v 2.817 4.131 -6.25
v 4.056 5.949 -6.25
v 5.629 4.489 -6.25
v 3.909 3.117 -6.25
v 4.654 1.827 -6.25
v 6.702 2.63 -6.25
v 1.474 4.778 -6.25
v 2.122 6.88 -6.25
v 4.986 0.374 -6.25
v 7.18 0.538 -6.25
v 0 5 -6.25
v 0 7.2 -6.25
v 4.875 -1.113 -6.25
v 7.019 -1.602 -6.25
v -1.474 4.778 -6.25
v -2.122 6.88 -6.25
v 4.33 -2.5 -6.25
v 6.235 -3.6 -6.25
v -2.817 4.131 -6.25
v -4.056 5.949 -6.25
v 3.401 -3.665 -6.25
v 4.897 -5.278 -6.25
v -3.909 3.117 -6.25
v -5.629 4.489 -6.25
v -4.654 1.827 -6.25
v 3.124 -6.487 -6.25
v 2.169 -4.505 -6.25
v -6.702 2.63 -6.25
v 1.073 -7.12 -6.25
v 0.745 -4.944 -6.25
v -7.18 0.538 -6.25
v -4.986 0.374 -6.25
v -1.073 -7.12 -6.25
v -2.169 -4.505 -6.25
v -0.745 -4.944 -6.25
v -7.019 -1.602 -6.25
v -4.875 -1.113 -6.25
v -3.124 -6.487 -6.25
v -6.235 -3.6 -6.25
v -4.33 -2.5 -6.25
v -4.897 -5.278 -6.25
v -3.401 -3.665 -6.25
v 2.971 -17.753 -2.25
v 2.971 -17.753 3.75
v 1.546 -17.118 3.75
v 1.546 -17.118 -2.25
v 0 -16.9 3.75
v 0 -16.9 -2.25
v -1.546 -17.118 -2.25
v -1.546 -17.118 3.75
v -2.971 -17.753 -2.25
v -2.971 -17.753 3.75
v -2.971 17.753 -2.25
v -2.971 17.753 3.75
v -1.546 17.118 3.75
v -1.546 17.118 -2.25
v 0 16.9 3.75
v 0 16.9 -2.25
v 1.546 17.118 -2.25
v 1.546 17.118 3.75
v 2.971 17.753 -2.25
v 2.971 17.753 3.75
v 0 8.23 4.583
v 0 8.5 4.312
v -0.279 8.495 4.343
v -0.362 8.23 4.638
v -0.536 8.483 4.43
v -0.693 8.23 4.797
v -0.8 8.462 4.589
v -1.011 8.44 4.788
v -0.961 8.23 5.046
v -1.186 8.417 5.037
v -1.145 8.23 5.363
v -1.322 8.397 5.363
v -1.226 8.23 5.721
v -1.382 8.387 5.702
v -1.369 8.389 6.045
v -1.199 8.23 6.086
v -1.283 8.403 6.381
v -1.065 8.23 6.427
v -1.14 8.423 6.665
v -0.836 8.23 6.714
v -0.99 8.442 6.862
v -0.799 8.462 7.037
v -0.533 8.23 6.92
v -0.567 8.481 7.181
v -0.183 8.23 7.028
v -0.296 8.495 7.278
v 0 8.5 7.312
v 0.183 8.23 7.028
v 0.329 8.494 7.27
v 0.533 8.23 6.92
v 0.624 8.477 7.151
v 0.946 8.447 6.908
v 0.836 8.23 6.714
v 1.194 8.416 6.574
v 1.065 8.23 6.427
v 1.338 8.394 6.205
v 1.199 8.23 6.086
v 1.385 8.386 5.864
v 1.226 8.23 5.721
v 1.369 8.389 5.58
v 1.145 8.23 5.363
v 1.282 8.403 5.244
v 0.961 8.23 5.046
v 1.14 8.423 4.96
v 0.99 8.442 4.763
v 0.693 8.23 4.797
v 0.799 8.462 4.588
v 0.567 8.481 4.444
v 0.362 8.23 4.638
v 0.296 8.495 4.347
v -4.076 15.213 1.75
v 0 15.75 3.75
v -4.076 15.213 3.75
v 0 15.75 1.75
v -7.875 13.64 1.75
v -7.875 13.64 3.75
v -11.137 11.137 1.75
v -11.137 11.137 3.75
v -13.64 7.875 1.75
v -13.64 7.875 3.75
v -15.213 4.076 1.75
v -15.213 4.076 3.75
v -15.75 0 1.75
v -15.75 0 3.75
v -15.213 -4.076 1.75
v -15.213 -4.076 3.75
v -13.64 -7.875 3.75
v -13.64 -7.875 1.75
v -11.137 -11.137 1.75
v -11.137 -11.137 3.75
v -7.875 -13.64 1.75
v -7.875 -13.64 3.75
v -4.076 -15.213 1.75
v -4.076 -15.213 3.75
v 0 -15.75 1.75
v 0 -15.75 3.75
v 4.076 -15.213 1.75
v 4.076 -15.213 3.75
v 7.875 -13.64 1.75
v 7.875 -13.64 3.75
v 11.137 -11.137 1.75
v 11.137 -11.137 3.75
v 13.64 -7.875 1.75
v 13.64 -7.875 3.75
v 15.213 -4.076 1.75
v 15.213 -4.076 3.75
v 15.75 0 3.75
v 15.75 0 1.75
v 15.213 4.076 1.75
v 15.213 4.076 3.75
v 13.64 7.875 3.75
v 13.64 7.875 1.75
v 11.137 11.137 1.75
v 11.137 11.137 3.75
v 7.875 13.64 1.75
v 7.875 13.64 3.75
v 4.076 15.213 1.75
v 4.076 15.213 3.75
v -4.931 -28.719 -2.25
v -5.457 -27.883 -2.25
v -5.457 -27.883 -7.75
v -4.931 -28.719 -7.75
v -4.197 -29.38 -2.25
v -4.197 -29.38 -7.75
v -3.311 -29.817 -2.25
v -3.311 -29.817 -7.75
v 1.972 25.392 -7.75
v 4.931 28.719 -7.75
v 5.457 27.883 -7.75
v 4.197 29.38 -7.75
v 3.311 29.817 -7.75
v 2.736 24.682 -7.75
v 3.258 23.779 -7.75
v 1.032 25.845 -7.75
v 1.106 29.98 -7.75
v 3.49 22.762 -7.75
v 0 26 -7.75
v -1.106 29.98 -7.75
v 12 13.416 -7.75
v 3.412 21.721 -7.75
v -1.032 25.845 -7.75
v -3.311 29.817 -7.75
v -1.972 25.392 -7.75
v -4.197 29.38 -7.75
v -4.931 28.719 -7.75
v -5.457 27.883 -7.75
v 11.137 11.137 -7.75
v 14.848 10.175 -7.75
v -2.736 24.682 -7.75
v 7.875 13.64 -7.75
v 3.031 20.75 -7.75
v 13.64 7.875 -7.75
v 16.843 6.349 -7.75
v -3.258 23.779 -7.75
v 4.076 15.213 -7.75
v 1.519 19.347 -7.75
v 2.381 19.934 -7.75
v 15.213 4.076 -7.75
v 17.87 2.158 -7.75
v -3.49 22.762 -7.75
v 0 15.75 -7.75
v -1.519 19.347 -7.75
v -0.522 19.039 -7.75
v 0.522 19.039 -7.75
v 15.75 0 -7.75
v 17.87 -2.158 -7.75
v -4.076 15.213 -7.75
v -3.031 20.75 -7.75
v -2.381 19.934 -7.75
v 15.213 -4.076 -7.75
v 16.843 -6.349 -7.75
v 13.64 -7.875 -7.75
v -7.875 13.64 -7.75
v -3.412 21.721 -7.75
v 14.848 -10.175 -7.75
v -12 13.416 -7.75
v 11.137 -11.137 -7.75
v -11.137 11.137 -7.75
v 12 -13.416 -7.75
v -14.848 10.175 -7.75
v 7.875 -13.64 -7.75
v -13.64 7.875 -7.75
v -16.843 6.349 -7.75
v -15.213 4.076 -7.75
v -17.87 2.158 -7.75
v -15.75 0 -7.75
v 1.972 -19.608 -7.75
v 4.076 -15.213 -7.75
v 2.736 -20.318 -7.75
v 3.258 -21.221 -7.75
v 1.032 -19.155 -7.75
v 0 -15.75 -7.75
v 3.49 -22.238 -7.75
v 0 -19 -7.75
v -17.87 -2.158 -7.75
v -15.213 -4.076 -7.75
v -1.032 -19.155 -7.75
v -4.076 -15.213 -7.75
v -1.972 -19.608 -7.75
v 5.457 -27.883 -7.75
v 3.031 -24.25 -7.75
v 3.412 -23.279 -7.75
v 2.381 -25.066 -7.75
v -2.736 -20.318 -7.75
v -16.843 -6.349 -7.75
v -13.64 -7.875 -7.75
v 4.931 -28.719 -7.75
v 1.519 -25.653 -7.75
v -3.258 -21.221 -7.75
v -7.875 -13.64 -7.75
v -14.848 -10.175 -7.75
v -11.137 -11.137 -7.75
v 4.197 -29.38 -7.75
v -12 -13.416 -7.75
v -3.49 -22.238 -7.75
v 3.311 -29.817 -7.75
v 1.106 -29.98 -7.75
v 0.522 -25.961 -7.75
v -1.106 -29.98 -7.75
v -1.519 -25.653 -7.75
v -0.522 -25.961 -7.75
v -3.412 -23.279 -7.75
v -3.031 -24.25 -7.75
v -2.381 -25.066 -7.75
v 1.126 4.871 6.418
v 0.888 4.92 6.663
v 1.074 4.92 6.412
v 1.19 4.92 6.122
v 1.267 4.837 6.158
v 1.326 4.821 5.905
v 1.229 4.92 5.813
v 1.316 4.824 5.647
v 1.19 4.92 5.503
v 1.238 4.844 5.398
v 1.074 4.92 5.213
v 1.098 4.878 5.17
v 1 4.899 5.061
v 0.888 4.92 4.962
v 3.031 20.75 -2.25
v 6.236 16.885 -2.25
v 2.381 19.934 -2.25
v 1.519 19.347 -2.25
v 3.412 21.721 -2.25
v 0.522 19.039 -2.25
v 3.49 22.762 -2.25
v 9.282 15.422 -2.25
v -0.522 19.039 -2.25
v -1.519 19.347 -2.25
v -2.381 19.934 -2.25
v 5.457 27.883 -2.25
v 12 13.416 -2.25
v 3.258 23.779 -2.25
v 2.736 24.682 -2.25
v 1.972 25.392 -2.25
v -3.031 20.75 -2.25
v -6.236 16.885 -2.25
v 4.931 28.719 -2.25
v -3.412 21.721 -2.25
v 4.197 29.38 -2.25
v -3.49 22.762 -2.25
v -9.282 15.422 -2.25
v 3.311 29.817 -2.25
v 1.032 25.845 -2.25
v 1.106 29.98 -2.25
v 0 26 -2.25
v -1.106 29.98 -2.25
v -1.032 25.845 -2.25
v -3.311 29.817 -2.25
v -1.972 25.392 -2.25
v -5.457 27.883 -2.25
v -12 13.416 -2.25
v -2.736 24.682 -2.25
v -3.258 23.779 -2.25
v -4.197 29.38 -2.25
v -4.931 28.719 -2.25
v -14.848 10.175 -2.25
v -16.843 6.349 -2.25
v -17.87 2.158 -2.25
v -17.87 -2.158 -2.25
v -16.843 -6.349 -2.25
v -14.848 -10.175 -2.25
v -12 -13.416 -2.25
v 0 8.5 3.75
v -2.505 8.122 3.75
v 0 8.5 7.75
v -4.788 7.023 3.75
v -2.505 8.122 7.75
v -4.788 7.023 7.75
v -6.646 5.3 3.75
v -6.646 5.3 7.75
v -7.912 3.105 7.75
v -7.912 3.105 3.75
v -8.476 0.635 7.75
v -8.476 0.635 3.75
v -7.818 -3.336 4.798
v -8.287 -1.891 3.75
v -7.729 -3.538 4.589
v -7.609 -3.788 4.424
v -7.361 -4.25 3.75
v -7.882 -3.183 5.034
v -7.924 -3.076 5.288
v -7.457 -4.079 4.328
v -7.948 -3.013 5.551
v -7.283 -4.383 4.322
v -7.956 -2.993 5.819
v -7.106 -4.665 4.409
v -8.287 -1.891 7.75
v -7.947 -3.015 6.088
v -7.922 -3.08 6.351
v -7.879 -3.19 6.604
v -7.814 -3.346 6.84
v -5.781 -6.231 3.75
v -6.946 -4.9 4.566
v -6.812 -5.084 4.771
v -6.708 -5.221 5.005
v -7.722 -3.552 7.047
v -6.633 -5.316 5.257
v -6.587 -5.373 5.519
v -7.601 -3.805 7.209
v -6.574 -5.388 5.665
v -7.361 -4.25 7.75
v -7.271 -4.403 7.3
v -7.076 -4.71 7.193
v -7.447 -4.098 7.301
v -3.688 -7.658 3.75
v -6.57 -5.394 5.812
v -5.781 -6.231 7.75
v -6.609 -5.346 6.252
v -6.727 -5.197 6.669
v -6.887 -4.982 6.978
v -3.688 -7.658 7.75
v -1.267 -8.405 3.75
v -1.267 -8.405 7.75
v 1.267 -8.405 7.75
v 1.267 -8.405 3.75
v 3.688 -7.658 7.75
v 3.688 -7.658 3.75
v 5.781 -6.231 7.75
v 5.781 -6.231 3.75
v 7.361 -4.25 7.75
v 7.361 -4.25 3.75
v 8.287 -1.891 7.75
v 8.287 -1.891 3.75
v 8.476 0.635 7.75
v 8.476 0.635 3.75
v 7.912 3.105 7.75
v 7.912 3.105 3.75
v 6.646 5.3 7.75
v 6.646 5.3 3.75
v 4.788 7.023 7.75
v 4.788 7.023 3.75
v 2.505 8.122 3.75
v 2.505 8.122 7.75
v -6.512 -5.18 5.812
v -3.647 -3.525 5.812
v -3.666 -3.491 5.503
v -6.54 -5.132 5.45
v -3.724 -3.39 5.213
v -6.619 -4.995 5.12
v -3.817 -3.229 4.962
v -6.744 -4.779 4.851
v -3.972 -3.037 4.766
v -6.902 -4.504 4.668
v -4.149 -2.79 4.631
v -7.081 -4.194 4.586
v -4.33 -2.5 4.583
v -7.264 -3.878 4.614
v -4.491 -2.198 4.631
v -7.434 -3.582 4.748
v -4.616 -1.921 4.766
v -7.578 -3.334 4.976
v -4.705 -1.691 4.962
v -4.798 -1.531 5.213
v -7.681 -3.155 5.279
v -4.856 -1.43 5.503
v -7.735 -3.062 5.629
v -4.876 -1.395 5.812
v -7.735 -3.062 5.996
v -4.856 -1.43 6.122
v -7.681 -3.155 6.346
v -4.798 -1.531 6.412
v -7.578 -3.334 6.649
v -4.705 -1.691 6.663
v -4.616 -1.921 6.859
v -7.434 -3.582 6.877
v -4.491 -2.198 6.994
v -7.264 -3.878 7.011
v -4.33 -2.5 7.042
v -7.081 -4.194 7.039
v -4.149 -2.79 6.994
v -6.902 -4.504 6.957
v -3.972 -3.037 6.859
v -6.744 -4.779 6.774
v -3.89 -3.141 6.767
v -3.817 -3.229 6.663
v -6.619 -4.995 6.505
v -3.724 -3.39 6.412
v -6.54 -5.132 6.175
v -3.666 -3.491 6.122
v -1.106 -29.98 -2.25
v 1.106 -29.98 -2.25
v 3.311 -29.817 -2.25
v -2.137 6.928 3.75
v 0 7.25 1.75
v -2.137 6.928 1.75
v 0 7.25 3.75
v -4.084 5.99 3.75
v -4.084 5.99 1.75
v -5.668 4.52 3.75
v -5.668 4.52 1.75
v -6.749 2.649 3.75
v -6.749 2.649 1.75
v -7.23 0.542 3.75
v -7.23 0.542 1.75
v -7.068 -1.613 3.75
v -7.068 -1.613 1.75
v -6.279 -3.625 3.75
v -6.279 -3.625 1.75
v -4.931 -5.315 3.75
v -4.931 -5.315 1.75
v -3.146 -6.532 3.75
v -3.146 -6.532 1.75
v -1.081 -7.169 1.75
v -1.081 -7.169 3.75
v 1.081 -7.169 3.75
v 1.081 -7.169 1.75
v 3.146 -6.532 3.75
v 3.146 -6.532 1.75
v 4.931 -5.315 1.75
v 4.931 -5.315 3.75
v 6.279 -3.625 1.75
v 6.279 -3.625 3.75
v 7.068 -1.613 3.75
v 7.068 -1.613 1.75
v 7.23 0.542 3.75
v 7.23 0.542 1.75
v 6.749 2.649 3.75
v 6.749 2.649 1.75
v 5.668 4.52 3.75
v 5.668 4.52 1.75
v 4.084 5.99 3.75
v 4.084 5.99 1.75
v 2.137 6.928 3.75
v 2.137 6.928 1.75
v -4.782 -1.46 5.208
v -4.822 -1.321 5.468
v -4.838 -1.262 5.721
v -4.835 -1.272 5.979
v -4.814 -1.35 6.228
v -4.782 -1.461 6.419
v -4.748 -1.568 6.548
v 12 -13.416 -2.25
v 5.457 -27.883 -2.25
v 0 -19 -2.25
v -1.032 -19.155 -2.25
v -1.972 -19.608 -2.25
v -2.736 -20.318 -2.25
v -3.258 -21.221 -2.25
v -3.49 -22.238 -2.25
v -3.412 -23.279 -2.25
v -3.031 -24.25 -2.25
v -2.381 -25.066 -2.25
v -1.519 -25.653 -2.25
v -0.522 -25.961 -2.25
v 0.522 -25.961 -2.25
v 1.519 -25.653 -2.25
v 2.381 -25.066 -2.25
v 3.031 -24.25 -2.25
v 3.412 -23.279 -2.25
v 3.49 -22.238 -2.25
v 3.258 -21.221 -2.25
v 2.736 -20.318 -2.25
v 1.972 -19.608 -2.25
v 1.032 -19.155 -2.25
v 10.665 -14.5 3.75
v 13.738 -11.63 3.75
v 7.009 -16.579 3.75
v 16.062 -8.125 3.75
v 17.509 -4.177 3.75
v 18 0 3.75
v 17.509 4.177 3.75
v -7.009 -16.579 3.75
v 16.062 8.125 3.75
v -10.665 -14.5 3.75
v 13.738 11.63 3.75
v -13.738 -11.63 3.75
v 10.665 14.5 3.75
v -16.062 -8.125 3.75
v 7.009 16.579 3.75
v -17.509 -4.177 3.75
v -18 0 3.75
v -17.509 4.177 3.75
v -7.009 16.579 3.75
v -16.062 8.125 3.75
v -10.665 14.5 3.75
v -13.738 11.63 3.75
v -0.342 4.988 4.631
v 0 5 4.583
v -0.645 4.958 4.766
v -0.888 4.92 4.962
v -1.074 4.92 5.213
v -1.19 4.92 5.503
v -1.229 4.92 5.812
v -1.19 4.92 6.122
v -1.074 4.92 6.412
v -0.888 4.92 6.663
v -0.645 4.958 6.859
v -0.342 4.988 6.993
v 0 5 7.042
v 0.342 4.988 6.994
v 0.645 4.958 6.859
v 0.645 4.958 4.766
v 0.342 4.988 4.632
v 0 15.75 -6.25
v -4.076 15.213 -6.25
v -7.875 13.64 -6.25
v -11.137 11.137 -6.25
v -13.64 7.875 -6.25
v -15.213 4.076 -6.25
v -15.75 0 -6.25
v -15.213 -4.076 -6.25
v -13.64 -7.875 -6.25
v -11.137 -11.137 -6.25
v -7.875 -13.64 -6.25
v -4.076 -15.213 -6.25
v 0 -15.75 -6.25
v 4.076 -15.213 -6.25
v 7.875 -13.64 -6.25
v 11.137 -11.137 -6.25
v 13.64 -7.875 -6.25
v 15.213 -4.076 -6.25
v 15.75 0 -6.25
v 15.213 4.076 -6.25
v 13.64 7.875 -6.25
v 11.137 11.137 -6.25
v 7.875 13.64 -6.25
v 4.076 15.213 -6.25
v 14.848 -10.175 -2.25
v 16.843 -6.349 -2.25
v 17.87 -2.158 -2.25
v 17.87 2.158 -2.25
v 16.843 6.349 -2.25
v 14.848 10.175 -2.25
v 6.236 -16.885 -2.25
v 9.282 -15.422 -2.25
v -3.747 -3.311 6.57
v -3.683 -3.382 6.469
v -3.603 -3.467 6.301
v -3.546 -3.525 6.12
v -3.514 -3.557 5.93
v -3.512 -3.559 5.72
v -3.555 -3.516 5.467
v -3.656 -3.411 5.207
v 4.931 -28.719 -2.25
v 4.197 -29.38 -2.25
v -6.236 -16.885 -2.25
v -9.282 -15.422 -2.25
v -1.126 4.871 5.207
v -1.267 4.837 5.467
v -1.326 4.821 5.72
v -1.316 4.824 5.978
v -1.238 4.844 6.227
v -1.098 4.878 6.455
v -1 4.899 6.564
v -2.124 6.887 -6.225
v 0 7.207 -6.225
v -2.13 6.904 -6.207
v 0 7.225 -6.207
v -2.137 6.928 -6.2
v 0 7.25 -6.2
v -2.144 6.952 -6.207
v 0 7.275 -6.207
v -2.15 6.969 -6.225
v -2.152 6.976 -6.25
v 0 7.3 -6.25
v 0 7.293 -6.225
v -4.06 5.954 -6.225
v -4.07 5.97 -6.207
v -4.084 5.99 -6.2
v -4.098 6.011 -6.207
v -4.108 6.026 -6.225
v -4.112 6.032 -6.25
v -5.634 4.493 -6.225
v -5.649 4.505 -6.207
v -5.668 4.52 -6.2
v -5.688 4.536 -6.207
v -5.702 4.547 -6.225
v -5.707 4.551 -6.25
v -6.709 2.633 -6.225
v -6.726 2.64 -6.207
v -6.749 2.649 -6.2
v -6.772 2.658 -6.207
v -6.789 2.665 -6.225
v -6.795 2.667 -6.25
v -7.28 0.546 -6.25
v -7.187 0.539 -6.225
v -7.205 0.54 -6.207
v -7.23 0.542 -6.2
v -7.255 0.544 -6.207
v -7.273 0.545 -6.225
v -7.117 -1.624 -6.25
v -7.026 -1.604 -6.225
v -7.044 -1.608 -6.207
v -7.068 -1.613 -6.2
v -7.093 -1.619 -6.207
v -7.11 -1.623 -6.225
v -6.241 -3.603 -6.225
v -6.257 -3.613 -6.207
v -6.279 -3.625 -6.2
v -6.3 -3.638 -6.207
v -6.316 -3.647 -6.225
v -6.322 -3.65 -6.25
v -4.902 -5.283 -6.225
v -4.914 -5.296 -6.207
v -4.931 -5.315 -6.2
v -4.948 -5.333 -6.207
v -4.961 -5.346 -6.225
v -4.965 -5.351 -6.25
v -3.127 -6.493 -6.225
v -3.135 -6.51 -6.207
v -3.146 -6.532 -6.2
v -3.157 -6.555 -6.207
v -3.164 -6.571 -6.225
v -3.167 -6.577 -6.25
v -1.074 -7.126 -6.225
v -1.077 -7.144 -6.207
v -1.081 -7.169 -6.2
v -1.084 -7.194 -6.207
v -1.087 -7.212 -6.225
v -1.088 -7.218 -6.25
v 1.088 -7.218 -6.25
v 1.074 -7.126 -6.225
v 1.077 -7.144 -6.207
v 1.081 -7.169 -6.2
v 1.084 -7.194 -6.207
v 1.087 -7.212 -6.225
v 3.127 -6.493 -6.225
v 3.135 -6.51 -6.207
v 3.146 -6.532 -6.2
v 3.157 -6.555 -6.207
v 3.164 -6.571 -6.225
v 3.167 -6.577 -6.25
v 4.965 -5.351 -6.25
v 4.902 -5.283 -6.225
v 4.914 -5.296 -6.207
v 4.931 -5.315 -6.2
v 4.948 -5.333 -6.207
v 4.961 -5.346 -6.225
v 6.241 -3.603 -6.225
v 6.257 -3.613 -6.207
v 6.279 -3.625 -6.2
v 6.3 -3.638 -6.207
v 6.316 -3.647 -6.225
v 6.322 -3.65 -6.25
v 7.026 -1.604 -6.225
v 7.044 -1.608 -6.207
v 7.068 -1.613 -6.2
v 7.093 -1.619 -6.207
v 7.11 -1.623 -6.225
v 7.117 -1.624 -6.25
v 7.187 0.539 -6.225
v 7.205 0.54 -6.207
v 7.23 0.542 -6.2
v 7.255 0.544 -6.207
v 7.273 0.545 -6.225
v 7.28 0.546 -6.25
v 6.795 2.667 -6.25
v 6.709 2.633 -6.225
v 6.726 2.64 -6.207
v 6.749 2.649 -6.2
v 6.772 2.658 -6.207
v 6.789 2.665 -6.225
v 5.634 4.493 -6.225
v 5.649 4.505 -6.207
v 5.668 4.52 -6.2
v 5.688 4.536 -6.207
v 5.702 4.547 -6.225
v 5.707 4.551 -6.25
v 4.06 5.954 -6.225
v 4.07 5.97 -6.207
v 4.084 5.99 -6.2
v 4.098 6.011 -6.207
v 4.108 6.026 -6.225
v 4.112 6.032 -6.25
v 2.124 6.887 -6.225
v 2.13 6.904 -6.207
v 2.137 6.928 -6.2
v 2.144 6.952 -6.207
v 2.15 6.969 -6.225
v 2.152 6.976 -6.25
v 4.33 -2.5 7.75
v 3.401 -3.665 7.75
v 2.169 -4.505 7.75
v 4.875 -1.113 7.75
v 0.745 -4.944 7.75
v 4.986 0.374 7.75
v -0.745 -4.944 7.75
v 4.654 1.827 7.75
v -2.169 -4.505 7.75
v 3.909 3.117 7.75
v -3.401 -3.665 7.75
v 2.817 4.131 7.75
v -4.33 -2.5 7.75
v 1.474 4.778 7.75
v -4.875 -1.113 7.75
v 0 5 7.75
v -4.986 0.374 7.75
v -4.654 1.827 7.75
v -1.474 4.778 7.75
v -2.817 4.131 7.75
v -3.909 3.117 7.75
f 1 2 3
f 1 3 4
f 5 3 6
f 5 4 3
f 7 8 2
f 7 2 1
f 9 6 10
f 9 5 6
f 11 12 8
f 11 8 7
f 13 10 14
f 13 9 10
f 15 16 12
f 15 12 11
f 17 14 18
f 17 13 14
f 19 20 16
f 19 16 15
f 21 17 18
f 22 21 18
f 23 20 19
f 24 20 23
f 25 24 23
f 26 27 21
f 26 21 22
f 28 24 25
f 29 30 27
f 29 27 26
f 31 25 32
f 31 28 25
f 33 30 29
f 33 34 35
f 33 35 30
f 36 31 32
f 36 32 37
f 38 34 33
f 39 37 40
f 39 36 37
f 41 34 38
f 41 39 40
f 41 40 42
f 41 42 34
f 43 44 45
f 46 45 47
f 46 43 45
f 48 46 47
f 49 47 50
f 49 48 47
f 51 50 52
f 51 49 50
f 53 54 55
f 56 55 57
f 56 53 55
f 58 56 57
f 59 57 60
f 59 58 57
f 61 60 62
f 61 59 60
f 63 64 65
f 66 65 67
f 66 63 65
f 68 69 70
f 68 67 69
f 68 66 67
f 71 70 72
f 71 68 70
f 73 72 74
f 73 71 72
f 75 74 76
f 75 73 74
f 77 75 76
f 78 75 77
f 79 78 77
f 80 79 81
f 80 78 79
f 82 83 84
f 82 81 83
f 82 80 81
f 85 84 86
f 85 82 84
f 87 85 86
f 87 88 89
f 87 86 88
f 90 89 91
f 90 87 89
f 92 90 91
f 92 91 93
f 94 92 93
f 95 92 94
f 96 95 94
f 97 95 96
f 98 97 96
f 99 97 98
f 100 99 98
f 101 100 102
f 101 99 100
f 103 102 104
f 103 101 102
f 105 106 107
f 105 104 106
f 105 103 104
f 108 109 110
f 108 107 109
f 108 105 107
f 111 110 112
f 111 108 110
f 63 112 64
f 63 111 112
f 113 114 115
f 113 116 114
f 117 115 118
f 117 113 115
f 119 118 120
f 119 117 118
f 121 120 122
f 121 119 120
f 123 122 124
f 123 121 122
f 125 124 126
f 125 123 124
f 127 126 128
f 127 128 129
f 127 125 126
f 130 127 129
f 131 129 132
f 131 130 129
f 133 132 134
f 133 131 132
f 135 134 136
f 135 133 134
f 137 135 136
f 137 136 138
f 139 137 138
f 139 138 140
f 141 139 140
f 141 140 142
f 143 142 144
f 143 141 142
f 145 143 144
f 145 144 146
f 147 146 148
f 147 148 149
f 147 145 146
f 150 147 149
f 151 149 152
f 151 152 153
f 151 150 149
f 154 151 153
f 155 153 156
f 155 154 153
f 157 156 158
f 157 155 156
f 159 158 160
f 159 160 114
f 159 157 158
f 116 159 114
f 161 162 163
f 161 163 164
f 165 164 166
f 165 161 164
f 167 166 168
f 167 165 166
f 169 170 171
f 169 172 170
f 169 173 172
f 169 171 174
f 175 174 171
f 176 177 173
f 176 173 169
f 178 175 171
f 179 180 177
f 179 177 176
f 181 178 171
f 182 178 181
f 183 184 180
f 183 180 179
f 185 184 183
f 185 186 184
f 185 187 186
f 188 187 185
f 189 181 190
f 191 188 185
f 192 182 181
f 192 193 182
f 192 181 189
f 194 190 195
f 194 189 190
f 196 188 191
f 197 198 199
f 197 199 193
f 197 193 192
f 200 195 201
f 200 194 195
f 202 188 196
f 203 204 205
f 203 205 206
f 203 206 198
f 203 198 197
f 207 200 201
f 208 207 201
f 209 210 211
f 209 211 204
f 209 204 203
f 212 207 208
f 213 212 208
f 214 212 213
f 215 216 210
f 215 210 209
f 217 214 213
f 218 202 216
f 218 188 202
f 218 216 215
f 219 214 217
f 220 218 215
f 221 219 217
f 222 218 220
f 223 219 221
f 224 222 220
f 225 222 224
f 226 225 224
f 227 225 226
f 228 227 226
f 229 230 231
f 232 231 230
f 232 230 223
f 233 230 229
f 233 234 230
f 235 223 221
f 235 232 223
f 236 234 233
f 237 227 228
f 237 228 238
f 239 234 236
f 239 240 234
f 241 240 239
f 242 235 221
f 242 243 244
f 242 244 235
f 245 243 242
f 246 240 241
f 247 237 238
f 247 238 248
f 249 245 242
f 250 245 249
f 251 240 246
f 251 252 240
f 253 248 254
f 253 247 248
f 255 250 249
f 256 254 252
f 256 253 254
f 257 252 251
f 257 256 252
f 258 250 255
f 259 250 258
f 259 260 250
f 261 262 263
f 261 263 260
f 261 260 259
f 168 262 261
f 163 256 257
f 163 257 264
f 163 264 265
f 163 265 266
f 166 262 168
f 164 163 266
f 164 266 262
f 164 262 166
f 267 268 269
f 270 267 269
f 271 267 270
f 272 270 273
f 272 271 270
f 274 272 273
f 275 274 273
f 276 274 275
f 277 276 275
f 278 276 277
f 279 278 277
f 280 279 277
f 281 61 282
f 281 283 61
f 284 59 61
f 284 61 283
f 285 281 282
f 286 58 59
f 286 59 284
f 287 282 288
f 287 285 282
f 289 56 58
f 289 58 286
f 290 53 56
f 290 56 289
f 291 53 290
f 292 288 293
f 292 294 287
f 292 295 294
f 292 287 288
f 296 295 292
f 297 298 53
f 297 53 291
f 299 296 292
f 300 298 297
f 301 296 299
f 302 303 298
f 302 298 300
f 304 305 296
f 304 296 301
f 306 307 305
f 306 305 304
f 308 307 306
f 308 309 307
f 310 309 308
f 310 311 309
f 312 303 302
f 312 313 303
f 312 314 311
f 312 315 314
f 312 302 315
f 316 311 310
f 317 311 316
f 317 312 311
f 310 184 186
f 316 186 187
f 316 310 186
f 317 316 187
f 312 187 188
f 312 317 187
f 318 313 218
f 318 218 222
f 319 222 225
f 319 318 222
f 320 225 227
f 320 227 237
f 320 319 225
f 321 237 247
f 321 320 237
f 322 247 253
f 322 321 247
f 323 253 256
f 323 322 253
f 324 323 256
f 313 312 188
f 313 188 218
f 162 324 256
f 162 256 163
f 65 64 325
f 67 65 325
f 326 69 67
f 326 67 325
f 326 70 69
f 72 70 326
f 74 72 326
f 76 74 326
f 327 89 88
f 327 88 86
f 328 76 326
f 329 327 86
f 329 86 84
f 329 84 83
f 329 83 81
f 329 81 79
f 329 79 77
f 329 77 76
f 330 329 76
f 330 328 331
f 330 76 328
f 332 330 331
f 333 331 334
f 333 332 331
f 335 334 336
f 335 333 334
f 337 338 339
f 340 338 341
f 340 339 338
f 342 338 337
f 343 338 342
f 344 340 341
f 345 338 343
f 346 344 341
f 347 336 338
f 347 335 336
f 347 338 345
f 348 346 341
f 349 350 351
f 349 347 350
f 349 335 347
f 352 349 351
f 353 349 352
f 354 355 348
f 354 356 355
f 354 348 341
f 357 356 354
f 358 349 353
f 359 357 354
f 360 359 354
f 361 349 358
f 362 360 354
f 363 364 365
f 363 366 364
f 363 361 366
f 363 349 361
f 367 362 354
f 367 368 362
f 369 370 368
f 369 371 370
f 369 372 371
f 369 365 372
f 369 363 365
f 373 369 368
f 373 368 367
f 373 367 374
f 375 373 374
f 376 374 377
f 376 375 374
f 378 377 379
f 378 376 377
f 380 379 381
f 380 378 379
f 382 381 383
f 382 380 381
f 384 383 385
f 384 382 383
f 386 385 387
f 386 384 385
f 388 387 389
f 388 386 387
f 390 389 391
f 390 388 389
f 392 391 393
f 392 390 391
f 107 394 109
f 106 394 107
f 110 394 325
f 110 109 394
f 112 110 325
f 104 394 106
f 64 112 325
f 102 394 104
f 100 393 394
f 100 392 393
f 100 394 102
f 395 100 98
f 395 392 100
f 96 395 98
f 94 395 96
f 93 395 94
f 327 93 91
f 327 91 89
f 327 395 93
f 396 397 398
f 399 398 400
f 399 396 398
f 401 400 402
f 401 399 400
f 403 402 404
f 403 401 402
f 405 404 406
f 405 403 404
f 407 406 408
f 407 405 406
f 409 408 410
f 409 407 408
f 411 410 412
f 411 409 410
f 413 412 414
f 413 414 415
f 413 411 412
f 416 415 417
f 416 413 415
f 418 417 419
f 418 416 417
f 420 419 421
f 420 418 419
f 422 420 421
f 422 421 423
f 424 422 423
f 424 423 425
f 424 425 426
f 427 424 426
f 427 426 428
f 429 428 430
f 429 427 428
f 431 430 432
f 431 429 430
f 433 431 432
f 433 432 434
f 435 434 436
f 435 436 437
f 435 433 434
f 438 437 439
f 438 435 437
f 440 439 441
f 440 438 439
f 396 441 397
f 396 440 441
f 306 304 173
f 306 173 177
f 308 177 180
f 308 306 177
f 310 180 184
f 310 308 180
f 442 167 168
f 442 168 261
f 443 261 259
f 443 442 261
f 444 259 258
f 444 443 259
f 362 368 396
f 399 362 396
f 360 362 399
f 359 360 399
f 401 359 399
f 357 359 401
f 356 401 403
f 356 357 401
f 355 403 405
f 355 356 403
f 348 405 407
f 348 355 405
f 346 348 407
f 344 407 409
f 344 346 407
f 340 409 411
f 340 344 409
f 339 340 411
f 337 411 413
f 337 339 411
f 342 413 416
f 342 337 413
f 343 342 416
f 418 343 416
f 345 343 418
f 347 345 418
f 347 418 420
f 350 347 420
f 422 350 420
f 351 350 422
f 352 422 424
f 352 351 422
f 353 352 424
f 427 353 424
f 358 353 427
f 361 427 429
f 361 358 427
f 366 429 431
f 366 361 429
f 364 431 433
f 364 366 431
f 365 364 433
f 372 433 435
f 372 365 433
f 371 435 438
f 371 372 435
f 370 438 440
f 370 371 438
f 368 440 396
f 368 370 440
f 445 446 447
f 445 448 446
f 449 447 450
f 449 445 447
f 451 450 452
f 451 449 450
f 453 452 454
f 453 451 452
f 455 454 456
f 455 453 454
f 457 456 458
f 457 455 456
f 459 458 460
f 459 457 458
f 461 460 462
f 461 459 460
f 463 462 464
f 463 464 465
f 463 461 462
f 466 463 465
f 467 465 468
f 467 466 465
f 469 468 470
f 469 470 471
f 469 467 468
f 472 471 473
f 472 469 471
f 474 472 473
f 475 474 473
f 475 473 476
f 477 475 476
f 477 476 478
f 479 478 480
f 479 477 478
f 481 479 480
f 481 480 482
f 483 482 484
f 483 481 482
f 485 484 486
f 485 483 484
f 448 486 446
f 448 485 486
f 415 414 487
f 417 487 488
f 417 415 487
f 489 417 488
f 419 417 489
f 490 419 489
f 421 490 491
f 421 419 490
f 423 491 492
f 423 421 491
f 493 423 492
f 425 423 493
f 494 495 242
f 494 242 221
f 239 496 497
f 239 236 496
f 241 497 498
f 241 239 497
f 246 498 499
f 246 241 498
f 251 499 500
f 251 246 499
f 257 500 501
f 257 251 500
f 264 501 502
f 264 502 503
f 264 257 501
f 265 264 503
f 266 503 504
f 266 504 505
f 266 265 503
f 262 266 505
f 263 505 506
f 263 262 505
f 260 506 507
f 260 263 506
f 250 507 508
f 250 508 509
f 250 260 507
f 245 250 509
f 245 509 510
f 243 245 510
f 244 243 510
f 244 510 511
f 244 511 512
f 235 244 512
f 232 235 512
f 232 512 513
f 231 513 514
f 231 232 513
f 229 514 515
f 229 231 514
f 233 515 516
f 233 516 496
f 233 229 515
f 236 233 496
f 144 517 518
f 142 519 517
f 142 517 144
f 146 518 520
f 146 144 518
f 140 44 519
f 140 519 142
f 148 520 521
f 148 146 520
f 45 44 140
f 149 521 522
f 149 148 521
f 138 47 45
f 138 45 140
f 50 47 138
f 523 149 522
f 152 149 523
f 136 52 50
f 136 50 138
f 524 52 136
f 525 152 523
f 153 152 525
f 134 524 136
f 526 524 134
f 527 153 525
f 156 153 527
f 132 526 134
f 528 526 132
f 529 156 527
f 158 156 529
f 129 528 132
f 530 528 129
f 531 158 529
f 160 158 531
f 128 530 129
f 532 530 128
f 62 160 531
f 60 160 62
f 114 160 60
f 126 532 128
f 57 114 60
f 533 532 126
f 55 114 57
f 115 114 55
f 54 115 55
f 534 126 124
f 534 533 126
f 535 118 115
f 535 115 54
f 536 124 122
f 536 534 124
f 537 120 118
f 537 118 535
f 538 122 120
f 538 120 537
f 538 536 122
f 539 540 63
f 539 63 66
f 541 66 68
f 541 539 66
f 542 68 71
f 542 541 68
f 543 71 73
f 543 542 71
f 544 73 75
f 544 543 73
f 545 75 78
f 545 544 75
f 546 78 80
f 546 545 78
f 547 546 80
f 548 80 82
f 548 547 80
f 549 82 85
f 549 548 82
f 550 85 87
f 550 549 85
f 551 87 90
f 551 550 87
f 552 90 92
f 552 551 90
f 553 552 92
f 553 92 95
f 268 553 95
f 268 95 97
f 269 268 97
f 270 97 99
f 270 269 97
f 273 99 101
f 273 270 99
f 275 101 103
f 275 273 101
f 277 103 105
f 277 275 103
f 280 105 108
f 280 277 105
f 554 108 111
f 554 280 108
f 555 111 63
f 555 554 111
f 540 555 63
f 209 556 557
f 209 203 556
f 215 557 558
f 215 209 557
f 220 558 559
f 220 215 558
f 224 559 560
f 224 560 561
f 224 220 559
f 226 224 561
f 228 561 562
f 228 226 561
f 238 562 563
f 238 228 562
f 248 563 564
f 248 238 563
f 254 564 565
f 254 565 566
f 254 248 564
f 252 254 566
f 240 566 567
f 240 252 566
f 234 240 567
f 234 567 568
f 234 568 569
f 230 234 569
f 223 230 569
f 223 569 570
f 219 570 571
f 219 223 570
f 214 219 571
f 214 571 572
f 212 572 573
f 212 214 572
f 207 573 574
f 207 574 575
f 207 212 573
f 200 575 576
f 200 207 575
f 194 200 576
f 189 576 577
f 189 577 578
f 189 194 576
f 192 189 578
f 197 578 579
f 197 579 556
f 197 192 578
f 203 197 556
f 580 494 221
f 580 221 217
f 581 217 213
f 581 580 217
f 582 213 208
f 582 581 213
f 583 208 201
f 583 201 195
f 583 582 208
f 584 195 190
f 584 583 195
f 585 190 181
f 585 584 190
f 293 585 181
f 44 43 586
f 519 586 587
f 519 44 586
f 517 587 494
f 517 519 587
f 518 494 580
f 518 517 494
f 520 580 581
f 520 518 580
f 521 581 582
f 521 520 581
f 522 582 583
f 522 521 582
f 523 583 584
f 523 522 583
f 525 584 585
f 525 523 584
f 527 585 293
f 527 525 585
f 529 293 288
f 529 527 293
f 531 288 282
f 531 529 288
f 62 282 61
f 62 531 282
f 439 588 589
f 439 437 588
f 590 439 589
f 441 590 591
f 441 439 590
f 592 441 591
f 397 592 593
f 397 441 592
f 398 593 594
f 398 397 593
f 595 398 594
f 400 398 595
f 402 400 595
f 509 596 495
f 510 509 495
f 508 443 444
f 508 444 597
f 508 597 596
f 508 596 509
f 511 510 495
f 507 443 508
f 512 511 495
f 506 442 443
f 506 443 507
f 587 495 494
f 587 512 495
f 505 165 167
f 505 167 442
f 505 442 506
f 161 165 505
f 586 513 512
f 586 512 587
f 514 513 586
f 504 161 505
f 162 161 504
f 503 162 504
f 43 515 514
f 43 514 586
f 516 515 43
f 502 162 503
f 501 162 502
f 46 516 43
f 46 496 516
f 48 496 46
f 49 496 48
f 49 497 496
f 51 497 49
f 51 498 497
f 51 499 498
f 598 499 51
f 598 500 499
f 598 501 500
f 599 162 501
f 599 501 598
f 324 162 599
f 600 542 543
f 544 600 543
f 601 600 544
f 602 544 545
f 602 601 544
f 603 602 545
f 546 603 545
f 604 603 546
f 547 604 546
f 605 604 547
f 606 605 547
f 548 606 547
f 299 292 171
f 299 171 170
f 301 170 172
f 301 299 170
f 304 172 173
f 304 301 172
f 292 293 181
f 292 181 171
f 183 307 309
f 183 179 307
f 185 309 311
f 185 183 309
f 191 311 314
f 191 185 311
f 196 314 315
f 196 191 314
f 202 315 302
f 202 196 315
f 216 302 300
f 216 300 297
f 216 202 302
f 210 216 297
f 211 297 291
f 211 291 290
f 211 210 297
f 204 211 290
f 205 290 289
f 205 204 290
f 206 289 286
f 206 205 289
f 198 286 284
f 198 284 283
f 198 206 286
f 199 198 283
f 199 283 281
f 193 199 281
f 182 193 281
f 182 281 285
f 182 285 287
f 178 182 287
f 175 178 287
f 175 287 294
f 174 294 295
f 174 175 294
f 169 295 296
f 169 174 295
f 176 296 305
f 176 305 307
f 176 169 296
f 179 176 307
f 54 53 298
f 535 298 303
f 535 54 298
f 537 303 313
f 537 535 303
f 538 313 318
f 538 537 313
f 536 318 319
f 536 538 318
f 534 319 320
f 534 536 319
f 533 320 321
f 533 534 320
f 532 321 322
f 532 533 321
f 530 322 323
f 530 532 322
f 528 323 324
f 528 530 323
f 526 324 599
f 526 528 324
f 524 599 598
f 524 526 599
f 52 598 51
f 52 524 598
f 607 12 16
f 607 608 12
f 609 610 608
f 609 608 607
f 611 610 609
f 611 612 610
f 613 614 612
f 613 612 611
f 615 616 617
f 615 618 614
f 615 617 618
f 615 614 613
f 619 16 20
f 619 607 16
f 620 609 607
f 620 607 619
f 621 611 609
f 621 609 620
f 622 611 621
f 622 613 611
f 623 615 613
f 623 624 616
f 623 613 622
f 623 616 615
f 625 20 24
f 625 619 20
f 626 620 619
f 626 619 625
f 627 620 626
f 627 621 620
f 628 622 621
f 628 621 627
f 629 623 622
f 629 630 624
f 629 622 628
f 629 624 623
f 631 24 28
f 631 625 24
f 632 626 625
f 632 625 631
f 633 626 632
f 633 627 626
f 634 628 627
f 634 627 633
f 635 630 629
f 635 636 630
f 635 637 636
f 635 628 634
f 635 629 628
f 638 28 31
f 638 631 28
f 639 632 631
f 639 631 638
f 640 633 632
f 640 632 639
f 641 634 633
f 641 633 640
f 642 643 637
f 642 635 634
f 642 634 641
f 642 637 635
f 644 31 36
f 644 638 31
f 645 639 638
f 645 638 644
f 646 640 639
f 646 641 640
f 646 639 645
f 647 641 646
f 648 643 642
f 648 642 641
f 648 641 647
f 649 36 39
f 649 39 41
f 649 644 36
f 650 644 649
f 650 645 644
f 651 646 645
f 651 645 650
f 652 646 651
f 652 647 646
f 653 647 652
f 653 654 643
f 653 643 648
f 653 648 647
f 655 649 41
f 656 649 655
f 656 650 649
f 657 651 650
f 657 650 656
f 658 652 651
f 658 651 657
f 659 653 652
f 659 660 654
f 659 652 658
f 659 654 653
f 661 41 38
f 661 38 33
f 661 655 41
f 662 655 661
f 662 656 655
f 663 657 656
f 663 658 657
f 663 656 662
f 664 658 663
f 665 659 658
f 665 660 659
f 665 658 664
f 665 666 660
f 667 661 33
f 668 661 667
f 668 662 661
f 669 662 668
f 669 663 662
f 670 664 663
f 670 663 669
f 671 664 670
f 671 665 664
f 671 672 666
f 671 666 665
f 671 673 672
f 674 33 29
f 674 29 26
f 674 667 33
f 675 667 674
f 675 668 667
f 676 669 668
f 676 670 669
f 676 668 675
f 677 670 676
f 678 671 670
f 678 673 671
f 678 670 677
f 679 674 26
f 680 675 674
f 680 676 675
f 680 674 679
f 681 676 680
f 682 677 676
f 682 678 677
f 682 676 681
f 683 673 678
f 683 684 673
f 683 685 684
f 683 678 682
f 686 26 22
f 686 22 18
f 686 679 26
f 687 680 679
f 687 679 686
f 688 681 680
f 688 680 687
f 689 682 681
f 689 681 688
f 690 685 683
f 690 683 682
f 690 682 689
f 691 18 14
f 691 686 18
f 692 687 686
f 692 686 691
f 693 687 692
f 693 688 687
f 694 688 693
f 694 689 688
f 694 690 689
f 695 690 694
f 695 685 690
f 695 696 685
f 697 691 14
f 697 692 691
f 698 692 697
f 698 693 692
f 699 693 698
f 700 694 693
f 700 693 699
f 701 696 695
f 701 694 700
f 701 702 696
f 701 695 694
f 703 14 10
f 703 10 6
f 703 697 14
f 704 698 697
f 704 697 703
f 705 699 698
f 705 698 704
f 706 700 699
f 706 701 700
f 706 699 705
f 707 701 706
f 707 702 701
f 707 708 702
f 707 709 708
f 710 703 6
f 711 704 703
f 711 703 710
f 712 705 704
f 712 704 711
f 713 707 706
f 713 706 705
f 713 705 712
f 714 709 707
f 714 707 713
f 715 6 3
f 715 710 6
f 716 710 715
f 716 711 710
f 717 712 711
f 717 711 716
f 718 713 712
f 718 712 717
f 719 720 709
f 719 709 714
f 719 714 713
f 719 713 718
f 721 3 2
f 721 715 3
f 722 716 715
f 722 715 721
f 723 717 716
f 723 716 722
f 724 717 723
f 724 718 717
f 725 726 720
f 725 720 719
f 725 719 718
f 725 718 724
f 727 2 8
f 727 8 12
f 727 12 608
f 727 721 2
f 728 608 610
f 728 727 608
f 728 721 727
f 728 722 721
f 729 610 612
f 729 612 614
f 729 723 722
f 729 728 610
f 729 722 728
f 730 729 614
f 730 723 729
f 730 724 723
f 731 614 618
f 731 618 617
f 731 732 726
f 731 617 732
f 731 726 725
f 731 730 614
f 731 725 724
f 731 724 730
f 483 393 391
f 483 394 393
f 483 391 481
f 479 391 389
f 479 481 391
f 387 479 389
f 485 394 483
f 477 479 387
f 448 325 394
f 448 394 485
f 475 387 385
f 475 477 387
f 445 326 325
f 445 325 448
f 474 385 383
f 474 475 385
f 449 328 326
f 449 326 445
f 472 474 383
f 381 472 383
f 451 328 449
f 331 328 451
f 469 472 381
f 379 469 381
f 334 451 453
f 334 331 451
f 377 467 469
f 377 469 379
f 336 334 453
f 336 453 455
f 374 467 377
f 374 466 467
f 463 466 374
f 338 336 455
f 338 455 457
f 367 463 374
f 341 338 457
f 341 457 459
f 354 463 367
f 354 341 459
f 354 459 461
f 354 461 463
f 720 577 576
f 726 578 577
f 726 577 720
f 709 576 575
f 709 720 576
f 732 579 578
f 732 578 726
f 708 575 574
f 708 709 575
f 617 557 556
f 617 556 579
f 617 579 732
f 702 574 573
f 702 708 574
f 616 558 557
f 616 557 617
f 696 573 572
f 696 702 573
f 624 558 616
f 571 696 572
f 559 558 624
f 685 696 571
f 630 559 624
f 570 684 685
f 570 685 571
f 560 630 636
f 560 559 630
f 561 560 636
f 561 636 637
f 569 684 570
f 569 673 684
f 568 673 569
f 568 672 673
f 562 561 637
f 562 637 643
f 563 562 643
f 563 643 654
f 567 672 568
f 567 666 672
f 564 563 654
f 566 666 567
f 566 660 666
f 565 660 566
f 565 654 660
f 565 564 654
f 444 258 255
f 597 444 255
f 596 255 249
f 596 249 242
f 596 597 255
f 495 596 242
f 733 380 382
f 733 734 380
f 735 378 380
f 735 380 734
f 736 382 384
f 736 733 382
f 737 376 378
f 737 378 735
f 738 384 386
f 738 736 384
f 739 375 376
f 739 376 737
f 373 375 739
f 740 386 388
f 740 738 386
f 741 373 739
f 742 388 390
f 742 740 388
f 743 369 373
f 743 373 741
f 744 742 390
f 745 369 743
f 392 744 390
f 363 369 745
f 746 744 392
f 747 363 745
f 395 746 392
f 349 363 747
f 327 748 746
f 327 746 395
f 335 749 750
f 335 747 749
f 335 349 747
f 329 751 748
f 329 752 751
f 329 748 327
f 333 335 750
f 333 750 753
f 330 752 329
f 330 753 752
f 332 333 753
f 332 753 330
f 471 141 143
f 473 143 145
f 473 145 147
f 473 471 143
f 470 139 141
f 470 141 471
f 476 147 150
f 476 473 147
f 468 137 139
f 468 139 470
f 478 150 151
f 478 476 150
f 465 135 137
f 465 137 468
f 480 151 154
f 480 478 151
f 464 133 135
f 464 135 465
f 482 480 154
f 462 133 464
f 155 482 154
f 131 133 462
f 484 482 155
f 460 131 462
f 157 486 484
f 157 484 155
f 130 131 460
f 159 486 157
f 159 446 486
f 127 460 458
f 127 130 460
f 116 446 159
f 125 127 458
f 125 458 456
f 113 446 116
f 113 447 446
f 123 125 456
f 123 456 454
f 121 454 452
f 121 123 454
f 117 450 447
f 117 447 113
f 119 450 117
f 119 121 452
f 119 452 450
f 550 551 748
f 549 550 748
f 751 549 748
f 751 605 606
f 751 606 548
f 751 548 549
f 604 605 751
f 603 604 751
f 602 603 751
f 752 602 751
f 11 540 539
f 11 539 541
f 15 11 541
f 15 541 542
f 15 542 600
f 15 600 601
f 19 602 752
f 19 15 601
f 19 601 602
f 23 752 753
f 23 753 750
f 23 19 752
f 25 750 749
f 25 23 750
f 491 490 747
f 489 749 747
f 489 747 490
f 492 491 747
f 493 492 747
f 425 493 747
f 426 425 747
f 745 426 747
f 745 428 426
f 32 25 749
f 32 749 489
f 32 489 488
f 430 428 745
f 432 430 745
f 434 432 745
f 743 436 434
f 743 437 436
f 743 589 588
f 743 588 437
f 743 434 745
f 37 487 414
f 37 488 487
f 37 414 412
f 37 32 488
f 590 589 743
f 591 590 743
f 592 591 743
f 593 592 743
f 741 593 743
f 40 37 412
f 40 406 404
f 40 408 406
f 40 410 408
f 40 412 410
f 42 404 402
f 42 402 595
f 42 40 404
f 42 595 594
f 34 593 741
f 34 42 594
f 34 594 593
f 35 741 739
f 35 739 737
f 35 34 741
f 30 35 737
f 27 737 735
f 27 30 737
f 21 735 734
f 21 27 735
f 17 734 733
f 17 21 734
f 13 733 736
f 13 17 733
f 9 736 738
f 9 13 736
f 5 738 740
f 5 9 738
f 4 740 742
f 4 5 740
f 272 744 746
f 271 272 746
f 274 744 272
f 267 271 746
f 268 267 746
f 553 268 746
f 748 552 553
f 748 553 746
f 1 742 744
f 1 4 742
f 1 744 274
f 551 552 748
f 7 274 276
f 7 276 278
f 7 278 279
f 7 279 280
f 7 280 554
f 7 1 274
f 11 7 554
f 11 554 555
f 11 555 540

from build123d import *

# Parameters (mm, degrees)
CUT_EXTRUDE_1_DEPTH      = 15.5
CUT_EXTRUDE_1_DEPTH_BACK = 15.5
SKETCH_2_W               = 144
SKETCH_2_H               = 240


with BuildPart() as part:
    # 草图1 → 旋转1 (revolve)
    with BuildSketch(Plane(origin=(0, 0, 0), x_dir=(0, 0, -1), z_dir=(1, 0, 0))):
        with BuildLine():
            Line((-7.75, 8.5), (-7.75, 5))
            Line((-7.75, 5), (6.25, 5))
            Line((6.25, 5), (6.25, 7.2))
            ThreePointArc((6.25, 7.2), (6.2, 7.25), (6.25, 7.3))
            Line((6.25, 7.3), (6.25, 15.75))
            Line((6.25, 15.75), (7.75, 15.75))
            Line((7.75, 15.75), (7.75, 30))
            Line((7.75, 30), (2.25, 30))
            Line((2.25, 30), (2.25, 18))
            Line((2.25, 18), (-3.75, 18))
            Line((-3.75, 18), (-3.75, 15.75))
            Line((-3.75, 15.75), (-1.75, 15.75))
            Line((-1.75, 15.75), (-1.75, 7.25))
            Line((-1.75, 7.25), (-3.75, 7.25))
            Line((-3.75, 7.25), (-3.75, 8.5))
            Line((-3.75, 8.5), (-7.75, 8.5))
        make_face()
    revolve(axis=Axis((0, 0, -7.75), (0, 0, 1)))

    # 草图2 → 切除-拉伸1 (cut, two sides: drawn at the far end of the back side and taken through both)
    with BuildSketch(Plane.XY.offset(-CUT_EXTRUDE_1_DEPTH_BACK)):
        Rectangle(SKETCH_2_W, SKETCH_2_H)
        with BuildLine():
            Line((-12, -13.416407865), (-5.457214514, -27.883459321))
            ThreePointArc((-5.457214514, -27.883459321), (-4.128933976, -29.424934177), (-2.177069938, -30))
            Line((-2.177069938, -30), (2.177069938, -30))
            ThreePointArc((2.177069938, -30), (4.128933976, -29.424934177), (5.457214514, -27.883459321))
            Line((5.457214514, -27.883459321), (12, -13.416407865))
            ThreePointArc((12, -13.416407865), (18, 0), (12, 13.416407865))
            Line((12, 13.416407865), (5.457214514, 27.883459321))
            ThreePointArc((5.457214514, 27.883459321), (4.128933976, 29.424934177), (2.177069938, 30))
            Line((2.177069938, 30), (-2.177069938, 30))
            ThreePointArc((-2.177069938, 30), (-4.128933976, 29.424934177), (-5.457214514, 27.883459321))
            Line((-5.457214514, 27.883459321), (-12, 13.416407865))
            ThreePointArc((-12, 13.416407865), (-18, 0), (-12, -13.416407865))
        make_face(mode=Mode.SUBTRACT)
    extrude(amount=CUT_EXTRUDE_1_DEPTH + CUT_EXTRUDE_1_DEPTH_BACK, mode=Mode.SUBTRACT)

    # 草图3 → 切除-旋转1 (revolve, cut)
    with BuildSketch(Plane(origin=(0, 0, 0), x_dir=(0, 0, -1), z_dir=(1, 0, 0))):
        Polygon((-7.75, 22.5), (-7.75, 28.1), (2.25, 28.1), (2.25, 26), (7.75, 26), (7.75, 22.5), align=None)
    revolve(axis=Axis((0, 22.5, -7.75), (0, 0, 1)), mode=Mode.SUBTRACT)

    # 草图4 → 切除-旋转2 (revolve, cut)
    with BuildSketch(Plane(origin=(0, 0, 0), x_dir=(0, 0, -1), z_dir=(1, 0, 0))):
        Polygon((-7.75, -22.5), (-7.75, -16.9), (2.25, -16.9), (2.25, -19), (7.75, -19), (7.75, -22.5), align=None)
    revolve(axis=Axis((0, -22.5, -7.75), (0, 0, 1)), mode=Mode.SUBTRACT)

    # 草图5 → 切除-旋转3 (revolve, cut)
    with BuildSketch(Plane(origin=(0, 0, 0), x_dir=(0, 0, -1), z_dir=(1, 0, 0))):
        Polygon((-5.8125, 8.5), (-4.3125, 8.5), (-4.583, 8.2295), (-4.583, 4.9205), (-4.3125, 4.65), (-5.8125, 4.65), align=None)
    revolve(axis=Axis((0, 4.65, 5.8125), (0, 1, 0)), mode=Mode.SUBTRACT)

    # 草图6 → 切除-旋转4 (revolve, cut)
    with BuildSketch(Plane.XY.offset(5.8125)):
        Polygon((-4.027018128, -2.325), (-3.277018128, -3.624038106), (-3.646527999, -3.525028234), (-6.51220606, -5.179528234), (-6.611215932, -5.549038106), (-7.361215932, -4.25), align=None)
    revolve(axis=Axis((-7.361215932, -4.25, 5.8125), (0.8660254037844392, 0.4999999999999992, 0)), mode=Mode.SUBTRACT)


solid = part.part
